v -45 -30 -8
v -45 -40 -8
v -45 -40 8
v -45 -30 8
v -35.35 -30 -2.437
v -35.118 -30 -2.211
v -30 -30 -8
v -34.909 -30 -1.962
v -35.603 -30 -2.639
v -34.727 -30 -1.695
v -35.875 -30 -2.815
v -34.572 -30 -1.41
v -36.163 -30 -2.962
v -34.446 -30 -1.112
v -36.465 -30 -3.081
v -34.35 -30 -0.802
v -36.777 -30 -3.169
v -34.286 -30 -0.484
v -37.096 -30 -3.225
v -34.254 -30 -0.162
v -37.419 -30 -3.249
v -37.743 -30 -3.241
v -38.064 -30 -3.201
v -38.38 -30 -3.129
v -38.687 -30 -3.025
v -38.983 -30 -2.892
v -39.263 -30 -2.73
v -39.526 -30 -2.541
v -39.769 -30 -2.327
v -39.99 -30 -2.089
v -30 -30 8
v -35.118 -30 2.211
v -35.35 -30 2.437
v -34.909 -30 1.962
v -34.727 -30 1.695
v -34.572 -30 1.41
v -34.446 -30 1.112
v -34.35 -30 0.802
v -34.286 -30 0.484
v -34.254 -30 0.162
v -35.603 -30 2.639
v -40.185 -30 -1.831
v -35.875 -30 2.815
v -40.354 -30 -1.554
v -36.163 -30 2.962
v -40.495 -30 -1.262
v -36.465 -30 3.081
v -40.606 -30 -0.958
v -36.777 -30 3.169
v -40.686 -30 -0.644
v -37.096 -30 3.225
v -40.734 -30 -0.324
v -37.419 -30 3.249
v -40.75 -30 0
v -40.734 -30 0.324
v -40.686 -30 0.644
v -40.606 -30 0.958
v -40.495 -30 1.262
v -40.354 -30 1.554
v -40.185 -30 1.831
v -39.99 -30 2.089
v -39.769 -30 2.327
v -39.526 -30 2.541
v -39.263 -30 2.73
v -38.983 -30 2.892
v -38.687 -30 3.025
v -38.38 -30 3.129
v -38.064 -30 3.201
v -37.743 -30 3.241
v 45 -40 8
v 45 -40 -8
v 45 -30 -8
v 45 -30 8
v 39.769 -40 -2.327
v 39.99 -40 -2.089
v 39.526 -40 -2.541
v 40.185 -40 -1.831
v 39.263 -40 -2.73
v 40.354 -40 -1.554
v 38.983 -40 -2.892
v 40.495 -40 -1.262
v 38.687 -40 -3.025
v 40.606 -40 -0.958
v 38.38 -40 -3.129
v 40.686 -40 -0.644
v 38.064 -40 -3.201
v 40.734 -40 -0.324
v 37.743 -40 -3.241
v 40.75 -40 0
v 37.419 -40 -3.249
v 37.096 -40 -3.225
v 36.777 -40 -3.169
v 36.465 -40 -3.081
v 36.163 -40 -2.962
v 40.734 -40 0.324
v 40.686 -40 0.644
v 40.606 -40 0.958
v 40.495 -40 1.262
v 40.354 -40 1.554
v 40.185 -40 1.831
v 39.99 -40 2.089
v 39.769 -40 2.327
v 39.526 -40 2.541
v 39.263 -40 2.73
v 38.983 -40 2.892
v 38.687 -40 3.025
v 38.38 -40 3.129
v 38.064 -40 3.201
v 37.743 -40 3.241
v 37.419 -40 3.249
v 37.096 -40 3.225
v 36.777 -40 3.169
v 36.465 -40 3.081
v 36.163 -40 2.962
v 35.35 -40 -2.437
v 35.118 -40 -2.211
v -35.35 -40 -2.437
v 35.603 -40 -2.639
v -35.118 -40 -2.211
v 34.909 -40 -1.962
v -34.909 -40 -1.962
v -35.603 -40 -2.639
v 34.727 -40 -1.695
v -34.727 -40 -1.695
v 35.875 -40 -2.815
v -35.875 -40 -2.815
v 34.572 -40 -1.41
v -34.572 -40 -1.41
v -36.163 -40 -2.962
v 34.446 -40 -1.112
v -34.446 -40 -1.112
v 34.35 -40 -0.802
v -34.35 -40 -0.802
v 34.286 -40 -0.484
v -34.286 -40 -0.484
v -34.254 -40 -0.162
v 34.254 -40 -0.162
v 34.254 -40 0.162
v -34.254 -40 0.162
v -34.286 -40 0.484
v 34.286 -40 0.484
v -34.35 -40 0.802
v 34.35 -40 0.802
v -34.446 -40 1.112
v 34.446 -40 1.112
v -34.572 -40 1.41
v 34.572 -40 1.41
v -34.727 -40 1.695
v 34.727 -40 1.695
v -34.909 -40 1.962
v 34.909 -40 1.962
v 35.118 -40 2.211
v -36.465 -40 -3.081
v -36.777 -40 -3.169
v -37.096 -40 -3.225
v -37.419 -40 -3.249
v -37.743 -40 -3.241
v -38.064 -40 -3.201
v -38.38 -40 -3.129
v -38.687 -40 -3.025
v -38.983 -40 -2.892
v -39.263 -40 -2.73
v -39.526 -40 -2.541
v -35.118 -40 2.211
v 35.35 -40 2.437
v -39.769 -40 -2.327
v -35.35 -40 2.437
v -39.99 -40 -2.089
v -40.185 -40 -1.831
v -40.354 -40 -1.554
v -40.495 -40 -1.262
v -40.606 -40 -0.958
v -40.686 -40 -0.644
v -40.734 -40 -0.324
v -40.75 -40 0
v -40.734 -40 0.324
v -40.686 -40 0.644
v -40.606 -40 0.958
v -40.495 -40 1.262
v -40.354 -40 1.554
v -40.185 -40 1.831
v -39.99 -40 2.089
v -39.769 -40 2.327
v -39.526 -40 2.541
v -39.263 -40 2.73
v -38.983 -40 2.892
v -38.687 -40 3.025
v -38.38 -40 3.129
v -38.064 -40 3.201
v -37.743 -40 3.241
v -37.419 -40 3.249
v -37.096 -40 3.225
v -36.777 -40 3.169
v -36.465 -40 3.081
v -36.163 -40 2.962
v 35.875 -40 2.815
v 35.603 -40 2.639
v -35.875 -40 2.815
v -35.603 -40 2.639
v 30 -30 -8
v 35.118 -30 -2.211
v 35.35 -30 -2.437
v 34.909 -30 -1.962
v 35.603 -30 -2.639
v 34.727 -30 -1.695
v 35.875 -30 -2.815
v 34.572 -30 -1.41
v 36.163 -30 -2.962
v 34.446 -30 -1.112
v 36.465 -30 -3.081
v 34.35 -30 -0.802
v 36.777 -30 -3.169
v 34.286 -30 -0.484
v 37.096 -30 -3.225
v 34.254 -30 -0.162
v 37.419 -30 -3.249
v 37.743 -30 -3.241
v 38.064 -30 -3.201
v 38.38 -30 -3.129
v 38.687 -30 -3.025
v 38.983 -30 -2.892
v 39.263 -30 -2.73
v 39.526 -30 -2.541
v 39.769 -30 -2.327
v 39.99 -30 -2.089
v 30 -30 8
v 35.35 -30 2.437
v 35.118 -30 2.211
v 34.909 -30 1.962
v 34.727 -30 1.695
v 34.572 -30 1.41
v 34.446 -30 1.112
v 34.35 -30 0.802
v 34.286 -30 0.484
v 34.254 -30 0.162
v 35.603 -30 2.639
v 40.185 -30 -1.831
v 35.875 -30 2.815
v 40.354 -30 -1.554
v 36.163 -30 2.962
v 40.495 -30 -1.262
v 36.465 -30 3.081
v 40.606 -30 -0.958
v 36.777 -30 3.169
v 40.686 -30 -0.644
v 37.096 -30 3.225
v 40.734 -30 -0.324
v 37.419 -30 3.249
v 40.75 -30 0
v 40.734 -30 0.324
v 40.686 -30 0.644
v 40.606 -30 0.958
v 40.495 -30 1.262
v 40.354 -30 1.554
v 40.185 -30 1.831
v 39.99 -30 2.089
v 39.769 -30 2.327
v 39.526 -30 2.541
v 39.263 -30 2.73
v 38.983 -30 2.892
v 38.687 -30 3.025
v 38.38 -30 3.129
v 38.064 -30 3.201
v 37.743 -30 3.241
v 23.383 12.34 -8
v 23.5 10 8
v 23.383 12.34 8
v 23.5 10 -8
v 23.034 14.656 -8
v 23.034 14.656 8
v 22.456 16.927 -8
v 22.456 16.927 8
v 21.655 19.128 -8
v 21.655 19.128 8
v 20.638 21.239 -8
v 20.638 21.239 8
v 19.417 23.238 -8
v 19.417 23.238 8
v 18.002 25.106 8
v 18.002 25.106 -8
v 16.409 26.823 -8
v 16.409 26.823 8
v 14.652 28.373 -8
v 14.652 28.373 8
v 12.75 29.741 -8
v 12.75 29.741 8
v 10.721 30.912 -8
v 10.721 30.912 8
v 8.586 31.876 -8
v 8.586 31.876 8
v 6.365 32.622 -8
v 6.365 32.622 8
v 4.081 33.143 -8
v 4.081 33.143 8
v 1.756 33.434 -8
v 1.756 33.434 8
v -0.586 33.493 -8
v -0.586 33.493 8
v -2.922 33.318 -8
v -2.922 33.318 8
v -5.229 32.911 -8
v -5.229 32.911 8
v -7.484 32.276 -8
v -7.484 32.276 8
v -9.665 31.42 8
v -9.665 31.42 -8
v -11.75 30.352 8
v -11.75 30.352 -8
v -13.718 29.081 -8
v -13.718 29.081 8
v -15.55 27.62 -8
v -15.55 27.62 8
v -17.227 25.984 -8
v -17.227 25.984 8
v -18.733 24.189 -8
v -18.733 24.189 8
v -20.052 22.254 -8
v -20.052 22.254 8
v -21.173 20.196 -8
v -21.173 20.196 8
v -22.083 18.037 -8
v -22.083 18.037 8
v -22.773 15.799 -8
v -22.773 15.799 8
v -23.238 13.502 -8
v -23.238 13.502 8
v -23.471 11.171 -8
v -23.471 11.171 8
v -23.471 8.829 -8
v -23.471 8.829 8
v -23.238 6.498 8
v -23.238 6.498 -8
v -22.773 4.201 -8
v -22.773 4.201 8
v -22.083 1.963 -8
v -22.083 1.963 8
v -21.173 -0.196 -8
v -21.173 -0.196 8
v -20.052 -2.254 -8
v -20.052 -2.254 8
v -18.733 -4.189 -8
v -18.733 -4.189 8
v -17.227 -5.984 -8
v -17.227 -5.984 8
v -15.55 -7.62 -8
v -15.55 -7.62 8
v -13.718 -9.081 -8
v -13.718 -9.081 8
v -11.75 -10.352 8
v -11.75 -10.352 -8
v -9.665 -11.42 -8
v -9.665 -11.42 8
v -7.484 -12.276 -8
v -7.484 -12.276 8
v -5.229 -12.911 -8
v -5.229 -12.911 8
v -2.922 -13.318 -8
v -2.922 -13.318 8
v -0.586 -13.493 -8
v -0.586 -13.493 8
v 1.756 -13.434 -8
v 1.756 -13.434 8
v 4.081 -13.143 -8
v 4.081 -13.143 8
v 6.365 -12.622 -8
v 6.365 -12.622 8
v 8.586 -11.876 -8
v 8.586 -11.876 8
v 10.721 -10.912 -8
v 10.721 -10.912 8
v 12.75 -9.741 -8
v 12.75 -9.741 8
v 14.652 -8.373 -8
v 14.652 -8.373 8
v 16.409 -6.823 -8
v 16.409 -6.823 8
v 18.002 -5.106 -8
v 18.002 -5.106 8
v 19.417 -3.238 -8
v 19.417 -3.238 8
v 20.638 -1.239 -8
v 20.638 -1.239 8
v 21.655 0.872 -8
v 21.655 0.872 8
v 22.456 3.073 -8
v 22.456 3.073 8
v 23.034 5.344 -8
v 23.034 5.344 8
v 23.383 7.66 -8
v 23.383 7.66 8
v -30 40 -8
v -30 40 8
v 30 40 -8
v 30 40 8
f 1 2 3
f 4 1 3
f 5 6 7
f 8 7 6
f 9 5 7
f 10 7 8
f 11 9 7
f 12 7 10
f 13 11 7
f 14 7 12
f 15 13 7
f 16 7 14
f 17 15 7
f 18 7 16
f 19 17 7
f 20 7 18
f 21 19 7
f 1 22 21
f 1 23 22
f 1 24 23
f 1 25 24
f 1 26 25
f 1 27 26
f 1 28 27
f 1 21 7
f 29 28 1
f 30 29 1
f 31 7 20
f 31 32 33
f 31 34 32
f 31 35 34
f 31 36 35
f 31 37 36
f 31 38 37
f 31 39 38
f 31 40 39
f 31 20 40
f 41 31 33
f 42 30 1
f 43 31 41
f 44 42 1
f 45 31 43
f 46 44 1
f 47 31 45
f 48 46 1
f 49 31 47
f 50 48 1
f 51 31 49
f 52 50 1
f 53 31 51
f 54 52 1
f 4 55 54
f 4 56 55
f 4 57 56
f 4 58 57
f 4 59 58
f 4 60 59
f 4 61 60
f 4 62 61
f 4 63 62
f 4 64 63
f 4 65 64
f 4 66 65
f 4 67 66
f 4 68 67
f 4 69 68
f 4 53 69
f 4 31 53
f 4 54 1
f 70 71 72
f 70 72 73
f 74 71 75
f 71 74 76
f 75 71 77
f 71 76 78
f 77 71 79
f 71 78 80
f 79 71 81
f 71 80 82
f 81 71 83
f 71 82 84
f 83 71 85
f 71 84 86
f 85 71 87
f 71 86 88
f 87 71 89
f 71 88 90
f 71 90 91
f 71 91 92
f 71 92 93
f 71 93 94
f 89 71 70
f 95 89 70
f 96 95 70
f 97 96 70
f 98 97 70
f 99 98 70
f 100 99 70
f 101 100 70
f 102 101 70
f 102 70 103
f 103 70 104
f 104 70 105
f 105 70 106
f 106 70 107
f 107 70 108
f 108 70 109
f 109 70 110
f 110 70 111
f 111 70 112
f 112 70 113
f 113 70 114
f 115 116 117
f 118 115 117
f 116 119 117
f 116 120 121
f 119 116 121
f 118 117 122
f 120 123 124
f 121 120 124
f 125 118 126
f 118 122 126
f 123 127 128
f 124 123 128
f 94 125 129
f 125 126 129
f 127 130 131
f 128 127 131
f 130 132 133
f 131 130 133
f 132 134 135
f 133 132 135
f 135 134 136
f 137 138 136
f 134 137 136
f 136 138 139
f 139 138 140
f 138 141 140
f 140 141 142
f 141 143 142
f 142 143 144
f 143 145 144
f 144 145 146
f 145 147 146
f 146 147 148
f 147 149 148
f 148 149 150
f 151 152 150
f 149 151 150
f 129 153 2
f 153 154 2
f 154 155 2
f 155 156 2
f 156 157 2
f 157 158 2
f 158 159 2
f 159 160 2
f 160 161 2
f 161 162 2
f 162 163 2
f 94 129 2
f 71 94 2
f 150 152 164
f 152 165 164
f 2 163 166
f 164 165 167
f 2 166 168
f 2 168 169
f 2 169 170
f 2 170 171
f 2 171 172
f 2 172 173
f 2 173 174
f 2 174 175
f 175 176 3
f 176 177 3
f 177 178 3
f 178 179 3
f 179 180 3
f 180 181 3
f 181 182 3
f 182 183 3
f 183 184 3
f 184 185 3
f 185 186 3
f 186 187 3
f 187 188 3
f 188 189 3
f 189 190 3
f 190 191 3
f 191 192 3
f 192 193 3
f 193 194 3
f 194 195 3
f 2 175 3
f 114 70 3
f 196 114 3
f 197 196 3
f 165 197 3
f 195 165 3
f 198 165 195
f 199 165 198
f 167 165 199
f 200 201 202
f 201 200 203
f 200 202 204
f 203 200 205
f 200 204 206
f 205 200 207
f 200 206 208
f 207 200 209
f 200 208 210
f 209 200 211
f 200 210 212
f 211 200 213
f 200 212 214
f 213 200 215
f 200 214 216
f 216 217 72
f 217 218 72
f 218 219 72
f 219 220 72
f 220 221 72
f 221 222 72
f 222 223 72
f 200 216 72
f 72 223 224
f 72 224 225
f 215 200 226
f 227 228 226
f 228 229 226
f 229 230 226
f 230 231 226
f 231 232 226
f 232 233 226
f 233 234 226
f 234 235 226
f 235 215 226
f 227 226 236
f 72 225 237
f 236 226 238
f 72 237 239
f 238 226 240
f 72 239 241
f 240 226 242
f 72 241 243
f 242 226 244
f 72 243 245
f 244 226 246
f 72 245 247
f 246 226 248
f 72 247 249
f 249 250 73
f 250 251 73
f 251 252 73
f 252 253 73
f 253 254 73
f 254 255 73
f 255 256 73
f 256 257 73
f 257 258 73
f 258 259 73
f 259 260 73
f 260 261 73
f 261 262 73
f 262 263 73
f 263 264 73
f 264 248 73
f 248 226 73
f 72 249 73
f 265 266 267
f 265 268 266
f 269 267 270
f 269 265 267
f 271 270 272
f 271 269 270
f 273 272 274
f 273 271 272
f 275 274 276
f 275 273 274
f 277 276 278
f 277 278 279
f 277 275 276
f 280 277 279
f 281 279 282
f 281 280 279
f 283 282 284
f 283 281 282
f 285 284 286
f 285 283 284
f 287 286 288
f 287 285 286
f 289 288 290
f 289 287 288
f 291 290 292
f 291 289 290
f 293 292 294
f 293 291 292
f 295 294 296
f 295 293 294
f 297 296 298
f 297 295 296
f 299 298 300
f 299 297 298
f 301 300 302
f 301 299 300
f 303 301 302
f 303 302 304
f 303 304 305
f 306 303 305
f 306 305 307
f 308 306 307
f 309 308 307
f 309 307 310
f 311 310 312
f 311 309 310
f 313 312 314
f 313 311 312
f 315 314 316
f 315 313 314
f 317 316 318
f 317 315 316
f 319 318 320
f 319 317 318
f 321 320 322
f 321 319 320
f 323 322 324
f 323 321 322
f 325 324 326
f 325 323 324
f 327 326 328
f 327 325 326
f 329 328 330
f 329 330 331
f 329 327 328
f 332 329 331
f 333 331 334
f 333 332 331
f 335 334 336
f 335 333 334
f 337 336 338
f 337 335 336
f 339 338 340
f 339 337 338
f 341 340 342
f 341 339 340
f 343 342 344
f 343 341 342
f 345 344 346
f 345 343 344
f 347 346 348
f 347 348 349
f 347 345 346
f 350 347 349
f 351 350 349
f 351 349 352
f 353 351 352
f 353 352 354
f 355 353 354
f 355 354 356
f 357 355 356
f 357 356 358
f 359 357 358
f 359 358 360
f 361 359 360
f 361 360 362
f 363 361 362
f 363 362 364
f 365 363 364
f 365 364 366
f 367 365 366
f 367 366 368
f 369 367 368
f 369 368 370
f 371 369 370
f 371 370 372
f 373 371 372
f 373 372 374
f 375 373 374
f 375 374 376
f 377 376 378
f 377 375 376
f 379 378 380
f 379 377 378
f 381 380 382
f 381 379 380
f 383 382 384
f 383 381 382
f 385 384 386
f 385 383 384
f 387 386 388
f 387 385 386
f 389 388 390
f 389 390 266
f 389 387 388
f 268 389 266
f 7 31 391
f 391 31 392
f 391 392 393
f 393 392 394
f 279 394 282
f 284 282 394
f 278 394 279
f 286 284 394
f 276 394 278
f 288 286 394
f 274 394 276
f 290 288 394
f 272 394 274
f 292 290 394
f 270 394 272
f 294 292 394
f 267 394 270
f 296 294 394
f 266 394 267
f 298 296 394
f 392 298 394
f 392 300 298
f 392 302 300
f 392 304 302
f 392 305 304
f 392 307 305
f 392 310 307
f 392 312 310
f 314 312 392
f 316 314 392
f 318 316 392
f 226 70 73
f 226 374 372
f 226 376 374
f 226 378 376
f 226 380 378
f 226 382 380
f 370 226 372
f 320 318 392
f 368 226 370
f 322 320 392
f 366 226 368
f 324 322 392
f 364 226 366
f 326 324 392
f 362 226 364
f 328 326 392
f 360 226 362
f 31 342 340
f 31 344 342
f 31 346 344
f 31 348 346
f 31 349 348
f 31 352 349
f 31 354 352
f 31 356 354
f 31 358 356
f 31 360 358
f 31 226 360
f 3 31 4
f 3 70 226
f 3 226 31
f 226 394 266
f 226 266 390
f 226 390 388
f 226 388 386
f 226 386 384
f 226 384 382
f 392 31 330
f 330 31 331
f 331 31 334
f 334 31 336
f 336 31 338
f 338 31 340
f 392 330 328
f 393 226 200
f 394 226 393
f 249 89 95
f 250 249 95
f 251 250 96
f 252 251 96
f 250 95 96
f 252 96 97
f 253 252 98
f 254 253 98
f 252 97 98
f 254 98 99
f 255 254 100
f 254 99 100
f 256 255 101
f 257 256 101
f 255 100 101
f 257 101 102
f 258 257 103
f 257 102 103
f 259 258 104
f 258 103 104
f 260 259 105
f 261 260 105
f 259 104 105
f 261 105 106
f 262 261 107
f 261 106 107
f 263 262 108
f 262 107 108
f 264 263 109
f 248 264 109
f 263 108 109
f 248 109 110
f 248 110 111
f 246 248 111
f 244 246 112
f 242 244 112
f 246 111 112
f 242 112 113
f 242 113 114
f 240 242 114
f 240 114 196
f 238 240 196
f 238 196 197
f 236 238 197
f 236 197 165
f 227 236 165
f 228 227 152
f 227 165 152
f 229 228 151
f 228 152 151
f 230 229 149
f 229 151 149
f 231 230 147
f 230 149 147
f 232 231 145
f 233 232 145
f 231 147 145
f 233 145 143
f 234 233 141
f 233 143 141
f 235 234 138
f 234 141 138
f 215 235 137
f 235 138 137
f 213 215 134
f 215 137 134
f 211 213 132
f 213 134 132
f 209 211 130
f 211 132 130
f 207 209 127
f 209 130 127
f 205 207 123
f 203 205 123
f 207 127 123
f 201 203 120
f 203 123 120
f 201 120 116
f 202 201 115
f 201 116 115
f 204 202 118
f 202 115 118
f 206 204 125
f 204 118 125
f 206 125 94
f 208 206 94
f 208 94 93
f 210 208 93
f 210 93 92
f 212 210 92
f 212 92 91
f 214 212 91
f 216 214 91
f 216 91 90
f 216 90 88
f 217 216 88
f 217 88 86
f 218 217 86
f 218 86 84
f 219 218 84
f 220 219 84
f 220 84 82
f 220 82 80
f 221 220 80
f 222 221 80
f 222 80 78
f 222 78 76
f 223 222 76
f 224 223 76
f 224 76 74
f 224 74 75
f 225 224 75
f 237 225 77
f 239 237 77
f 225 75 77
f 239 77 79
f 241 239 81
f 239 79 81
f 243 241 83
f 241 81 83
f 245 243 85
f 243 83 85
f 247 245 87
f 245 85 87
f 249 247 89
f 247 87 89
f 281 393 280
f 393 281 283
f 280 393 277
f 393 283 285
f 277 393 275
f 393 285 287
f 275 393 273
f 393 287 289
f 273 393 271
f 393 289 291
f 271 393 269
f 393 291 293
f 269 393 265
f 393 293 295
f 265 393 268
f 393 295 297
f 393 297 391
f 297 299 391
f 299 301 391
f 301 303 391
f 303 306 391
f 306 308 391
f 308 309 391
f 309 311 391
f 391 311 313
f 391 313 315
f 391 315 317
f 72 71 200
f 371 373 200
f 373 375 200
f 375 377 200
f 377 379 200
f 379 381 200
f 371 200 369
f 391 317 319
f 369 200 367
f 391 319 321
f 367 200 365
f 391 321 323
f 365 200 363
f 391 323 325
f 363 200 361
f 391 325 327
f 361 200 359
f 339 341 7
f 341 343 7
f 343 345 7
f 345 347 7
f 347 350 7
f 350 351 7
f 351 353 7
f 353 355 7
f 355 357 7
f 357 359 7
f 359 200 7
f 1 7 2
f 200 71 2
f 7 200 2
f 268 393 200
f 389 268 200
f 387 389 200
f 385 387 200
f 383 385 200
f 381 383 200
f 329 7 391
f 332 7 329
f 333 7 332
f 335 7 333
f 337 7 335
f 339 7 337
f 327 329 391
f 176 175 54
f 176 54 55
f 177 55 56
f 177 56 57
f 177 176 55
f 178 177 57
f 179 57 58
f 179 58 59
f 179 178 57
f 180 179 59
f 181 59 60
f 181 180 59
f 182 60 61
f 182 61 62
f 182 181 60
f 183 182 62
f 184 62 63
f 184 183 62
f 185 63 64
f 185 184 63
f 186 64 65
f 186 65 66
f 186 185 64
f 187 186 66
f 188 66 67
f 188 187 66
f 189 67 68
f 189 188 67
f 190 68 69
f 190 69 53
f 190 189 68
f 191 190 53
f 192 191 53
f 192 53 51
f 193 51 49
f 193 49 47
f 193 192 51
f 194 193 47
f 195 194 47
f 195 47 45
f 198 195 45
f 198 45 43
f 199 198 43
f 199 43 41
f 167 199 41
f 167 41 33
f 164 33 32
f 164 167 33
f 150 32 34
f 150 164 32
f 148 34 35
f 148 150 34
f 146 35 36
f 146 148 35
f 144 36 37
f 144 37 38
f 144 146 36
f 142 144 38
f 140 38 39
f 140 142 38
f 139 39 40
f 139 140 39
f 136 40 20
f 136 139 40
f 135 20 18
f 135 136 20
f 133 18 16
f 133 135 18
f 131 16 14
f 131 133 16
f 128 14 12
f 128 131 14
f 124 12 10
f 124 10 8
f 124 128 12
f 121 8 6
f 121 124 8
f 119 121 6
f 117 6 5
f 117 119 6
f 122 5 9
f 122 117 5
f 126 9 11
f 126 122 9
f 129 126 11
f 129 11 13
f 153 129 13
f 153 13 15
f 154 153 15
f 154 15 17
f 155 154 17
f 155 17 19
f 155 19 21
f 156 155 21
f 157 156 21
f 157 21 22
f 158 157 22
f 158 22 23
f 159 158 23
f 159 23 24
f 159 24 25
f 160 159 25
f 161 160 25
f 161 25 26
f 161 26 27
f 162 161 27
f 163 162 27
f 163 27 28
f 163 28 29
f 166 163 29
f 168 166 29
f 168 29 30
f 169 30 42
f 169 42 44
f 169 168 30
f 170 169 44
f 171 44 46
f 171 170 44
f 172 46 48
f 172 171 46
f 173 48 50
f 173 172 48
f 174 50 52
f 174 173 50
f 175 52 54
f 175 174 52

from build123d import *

# Parameters (mm, degrees)
SKETCH1_W           = 60
SKETCH1_H           = 80
SKETCH1_R           = 23.5
BOSS_EXTRUDE1_DEPTH = 8
SKETCH2_W           = 15
SKETCH2_H           = 16
SKETCH2_R           = 3.25
BOSS_EXTRUDE2_DEPTH = 10


with BuildPart() as part:
    # Sketch1 → Boss-Extrude1 (new body, symmetric)
    with BuildSketch(Plane.XY):
        Rectangle(SKETCH1_W, SKETCH1_H)
        with Locations((0, 10)):
            Circle(SKETCH1_R, mode=Mode.SUBTRACT)
    extrude(amount=BOSS_EXTRUDE1_DEPTH, both=True)

    # Sketch2 → Boss-Extrude2 (add)
    with BuildSketch(Plane.XZ.offset(40)):
        with Locations((37.5, 0)):
            Rectangle(SKETCH2_W, SKETCH2_H)
        with Locations((37.5, 0)):
            Circle(SKETCH2_R, mode=Mode.SUBTRACT)
    boss_extrude2 = extrude(amount=-BOSS_EXTRUDE2_DEPTH)

    # Mirror1: Boss-Extrude2 across plane
    add(boss_extrude2.mirror(Plane(origin=(0, 0, 0), x_dir=(0, 0, 1), z_dir=(1, 0, 0))))


solid = part.part
